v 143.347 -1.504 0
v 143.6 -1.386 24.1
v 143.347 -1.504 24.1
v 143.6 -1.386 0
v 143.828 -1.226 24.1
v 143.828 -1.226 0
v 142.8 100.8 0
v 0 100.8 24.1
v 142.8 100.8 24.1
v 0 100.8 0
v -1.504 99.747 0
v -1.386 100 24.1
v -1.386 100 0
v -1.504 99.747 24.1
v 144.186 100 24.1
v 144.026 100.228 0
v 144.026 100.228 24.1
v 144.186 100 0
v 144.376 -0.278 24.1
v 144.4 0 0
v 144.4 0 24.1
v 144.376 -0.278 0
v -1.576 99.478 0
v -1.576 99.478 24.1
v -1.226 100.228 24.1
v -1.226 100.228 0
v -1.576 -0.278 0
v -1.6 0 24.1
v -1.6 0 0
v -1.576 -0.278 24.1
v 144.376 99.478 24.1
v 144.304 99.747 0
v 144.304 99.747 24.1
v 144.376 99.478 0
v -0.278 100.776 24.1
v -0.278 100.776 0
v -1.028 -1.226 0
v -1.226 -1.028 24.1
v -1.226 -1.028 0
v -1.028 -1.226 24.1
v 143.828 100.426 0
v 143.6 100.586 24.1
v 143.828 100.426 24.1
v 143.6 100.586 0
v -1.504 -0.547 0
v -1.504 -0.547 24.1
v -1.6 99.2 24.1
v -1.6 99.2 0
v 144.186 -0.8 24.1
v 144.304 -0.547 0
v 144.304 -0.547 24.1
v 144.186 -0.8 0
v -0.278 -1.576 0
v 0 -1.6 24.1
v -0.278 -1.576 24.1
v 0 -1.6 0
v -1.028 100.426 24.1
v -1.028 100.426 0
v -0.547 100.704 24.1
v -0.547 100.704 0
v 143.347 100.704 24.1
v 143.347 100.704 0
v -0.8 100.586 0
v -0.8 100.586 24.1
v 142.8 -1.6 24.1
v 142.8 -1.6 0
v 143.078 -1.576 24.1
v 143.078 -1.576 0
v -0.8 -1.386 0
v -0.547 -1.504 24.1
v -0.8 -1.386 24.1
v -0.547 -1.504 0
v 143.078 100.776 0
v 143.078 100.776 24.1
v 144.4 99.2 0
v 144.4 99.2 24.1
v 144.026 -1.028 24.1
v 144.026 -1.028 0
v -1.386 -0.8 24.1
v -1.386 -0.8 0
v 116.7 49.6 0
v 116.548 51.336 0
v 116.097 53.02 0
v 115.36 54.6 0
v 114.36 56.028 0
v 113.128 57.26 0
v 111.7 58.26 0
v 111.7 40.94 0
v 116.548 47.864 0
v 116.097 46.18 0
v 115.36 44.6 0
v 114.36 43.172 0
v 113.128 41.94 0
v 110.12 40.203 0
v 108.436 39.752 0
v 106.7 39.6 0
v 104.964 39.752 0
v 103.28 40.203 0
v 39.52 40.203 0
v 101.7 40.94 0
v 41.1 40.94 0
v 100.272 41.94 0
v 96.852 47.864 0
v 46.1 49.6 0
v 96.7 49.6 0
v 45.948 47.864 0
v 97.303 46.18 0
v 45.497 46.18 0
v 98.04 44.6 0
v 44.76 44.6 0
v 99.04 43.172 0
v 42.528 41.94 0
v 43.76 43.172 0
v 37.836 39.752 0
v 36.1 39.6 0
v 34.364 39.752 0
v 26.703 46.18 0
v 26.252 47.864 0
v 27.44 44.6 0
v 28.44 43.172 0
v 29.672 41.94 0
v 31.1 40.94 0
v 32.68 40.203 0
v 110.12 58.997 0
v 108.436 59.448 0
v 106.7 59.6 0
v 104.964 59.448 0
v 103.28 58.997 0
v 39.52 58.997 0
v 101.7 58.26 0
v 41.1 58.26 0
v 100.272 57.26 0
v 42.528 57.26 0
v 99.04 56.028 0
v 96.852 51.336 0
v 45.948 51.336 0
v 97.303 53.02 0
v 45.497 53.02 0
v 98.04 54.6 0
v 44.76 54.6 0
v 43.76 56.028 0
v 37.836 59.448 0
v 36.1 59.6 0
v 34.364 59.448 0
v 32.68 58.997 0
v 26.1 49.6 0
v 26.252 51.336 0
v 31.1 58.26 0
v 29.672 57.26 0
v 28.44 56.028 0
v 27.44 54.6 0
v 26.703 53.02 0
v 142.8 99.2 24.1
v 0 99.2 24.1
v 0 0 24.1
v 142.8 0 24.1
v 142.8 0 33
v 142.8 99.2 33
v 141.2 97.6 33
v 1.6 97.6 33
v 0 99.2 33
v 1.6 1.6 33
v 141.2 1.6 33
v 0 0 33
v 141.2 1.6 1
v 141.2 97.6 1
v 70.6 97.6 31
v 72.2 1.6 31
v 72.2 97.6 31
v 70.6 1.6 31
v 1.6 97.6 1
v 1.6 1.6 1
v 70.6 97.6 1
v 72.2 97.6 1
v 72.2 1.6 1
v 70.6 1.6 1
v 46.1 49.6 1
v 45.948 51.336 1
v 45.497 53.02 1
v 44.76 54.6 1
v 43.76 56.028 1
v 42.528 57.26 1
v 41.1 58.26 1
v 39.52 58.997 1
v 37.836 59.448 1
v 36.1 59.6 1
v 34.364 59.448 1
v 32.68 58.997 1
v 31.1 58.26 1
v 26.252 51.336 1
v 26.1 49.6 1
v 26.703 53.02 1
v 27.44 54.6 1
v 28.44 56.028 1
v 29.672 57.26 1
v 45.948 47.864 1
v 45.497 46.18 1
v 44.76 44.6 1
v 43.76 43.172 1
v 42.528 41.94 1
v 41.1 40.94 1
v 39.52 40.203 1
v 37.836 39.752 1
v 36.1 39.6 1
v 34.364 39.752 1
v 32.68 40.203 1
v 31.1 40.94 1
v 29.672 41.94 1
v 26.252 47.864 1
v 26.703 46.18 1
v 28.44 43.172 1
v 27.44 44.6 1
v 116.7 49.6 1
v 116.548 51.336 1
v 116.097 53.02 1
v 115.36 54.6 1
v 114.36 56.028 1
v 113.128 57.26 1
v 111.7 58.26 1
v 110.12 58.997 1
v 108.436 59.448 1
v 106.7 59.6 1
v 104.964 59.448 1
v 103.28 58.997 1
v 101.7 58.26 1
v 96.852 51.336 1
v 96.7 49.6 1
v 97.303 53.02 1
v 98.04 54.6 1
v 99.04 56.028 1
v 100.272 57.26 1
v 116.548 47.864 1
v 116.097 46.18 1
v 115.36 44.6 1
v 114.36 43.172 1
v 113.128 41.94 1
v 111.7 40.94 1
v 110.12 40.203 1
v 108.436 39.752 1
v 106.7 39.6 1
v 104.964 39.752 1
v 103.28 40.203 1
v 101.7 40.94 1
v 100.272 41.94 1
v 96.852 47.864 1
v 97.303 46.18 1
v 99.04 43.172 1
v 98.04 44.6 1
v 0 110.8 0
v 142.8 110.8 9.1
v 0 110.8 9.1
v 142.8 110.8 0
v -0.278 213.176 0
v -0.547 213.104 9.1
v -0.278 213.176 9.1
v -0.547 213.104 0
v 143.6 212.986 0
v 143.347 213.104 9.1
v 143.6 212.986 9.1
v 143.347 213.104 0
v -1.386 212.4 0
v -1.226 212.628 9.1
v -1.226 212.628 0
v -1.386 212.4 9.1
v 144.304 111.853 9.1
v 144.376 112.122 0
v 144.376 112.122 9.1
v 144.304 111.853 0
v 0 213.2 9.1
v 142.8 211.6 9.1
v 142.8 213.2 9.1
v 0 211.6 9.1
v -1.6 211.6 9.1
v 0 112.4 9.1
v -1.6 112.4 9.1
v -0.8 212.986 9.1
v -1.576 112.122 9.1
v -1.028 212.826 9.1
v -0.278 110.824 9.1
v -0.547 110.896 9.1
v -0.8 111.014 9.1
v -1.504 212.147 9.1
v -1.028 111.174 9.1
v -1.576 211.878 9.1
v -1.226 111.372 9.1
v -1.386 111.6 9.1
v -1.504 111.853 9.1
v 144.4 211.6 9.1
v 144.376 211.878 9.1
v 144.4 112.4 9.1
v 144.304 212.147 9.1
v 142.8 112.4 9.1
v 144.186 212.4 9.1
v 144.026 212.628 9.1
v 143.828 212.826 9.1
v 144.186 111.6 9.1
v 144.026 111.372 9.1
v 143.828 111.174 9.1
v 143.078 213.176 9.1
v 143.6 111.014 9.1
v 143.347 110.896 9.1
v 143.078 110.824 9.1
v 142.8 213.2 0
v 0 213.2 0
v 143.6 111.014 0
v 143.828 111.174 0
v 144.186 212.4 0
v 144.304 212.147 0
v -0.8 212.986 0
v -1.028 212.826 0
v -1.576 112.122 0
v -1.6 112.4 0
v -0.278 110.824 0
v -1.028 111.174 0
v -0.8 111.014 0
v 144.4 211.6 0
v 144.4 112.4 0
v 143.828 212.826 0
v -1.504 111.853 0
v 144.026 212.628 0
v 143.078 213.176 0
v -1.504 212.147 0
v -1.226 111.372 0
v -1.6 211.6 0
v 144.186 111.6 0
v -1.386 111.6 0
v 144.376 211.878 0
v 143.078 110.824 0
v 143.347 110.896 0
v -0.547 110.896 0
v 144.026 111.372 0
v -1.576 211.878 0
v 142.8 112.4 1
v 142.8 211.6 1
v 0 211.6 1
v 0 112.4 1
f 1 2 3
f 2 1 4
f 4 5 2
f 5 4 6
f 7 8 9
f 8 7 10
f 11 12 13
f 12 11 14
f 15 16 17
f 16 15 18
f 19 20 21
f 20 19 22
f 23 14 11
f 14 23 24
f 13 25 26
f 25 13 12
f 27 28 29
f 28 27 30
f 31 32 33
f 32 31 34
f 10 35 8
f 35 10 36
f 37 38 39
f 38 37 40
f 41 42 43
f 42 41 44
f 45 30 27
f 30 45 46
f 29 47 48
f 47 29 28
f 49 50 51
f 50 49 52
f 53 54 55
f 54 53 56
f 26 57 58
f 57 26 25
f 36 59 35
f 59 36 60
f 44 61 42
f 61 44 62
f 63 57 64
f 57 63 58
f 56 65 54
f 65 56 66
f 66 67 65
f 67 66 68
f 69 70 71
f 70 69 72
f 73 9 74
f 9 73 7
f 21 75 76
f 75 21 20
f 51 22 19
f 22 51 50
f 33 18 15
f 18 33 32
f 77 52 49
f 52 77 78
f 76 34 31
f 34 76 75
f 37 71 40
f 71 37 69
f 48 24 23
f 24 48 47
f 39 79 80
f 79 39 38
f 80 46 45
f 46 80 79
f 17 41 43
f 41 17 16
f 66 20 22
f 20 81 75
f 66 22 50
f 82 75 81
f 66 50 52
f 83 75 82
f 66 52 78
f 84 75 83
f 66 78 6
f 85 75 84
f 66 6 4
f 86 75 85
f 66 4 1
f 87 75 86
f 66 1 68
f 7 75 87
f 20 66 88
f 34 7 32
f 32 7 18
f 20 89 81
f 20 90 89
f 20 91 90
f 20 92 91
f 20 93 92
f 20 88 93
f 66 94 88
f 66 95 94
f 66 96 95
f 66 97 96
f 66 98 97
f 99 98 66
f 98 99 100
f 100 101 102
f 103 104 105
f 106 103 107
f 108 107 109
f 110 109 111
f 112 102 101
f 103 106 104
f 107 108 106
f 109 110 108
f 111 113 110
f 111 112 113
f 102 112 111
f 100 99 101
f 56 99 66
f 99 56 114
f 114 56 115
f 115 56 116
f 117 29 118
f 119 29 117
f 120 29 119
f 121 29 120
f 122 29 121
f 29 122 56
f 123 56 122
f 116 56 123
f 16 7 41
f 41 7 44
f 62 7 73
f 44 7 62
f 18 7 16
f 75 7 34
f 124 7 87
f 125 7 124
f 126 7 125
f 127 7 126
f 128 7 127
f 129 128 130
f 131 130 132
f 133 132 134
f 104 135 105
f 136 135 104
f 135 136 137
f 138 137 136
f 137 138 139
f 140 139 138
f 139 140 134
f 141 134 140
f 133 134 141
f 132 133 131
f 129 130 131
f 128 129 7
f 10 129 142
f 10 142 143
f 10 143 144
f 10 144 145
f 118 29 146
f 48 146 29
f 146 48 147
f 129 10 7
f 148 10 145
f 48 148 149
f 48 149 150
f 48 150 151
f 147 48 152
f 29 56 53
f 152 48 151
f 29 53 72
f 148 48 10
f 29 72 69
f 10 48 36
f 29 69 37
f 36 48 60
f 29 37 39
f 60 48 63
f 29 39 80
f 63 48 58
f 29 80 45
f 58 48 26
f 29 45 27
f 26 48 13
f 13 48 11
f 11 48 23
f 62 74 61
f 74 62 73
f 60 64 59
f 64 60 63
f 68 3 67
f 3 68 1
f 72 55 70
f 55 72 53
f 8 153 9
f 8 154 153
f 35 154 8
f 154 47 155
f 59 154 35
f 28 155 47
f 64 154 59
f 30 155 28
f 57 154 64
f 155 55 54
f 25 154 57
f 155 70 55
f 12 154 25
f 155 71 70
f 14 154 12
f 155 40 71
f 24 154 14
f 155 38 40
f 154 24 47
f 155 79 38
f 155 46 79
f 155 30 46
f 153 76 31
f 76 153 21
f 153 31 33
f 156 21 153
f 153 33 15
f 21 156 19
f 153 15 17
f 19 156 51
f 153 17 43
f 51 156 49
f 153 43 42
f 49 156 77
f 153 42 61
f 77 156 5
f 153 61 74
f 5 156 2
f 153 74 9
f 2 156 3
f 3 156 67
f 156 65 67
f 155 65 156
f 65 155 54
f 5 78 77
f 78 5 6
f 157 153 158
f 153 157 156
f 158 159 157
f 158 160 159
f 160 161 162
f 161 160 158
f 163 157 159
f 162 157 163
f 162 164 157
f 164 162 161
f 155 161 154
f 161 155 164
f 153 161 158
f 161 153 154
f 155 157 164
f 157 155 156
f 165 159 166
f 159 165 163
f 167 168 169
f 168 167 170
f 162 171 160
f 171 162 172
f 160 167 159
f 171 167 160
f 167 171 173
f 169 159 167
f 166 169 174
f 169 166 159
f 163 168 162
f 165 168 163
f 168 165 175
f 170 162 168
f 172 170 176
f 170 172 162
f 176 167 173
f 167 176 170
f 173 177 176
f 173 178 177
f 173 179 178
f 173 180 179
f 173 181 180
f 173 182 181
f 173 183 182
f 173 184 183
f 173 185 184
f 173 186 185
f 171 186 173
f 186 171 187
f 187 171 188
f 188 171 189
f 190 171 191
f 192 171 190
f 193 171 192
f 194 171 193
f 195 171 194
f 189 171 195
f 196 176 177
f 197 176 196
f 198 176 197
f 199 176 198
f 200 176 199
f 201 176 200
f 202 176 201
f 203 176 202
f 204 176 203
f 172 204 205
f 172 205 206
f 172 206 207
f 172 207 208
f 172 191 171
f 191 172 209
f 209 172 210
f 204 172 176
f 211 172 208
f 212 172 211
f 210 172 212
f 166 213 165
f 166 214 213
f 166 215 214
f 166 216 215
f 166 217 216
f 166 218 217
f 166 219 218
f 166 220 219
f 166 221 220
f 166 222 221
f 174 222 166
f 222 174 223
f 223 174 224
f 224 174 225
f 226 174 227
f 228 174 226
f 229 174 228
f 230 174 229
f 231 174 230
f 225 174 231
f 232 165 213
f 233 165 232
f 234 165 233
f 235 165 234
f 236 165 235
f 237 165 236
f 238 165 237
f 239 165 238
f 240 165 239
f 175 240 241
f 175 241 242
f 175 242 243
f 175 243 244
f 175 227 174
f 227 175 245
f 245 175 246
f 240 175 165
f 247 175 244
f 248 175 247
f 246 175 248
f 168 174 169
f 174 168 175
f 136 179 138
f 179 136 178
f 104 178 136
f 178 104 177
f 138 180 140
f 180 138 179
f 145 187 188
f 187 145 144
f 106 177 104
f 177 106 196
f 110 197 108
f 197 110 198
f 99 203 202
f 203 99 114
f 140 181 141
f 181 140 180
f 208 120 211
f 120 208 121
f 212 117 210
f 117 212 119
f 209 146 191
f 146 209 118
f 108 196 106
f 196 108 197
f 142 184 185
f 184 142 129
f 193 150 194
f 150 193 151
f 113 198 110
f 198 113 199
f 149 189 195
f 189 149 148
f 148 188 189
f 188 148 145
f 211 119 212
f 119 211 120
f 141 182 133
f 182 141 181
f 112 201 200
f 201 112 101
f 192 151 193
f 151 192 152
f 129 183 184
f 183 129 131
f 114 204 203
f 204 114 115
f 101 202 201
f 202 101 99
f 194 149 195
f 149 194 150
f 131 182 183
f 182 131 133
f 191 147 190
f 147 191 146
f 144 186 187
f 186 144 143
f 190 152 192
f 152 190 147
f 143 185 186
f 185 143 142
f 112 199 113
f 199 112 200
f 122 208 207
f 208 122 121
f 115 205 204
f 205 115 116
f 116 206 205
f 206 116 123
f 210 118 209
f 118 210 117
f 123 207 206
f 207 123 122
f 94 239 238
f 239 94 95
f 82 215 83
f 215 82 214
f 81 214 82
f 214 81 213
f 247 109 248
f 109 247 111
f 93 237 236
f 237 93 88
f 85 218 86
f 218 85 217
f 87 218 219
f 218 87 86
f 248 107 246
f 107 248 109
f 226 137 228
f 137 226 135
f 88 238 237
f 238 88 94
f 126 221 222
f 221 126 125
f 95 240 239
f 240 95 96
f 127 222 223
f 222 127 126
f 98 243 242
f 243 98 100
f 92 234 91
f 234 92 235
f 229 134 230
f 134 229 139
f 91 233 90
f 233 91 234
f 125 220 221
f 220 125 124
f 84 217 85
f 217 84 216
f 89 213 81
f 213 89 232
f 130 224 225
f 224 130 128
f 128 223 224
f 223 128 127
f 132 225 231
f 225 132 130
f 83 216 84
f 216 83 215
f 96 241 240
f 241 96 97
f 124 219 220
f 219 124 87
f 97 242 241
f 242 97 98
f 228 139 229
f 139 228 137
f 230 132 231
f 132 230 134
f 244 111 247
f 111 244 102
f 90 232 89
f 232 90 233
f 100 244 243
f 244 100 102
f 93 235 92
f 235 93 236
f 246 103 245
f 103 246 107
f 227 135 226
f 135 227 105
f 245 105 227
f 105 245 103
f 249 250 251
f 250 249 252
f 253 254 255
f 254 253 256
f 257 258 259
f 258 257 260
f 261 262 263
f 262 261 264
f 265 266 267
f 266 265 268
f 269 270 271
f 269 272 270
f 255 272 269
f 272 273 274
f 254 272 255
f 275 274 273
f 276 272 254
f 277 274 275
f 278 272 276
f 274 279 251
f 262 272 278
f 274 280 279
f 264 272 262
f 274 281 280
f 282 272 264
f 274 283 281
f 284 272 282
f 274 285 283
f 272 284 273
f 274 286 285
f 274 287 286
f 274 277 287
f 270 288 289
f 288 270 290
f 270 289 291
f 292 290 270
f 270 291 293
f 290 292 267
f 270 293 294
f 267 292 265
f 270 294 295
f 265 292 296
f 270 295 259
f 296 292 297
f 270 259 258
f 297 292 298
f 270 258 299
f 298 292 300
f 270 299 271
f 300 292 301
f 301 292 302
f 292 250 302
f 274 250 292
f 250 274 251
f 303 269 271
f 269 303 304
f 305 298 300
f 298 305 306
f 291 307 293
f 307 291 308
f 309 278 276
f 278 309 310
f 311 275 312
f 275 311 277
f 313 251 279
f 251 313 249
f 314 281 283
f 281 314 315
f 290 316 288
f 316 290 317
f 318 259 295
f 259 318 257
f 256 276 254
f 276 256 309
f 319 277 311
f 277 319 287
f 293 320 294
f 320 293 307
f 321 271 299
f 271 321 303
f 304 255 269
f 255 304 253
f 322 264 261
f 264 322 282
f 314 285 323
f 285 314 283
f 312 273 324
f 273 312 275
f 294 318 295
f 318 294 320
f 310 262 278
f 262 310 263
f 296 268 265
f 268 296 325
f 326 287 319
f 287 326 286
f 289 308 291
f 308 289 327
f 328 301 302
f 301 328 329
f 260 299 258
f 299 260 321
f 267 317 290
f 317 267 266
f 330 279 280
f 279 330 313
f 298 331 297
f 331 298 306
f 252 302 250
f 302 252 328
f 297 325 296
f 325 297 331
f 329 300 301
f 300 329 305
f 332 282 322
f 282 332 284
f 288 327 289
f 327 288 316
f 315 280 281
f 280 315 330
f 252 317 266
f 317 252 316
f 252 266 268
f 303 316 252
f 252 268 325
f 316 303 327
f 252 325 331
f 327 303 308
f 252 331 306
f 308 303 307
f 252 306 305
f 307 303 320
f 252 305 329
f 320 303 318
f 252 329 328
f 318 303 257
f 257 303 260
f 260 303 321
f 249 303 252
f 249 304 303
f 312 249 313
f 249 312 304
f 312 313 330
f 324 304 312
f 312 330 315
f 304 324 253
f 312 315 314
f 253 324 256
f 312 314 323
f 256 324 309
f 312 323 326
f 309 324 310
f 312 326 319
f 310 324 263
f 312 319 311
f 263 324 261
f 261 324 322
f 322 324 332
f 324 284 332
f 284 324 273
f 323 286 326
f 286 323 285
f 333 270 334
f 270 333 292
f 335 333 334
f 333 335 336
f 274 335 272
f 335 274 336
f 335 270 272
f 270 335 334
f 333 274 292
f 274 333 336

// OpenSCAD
// Innovation 3rd Edition
//
// by W. Craig Trader is dual-licensed under 
// Creative Commons Attribution-ShareAlike 3.0 Unported License and
// GNU Lesser GPL 3.0 or later.

include <MCAD/units.scad>;

// Physical dimensions
WALL = 0.8 * mm; // Slicing filament thickness
GAP  = 0.2 * mm; // Size differential between box and lid, for snug fit
POKE_HOLE = 20 * mm; // Diameter of poke holes in bottom
BOTTOM = 1 * mm;

// Tile dimensions
CARD_WIDTH = 69 * mm;       // (X) Width of card
CARD_HEIGHT = 96 * mm;      // (Y) Height of card
DECK_THICKNESS = 30 * mm;   // (Z) Thickness of card stack

BOARD_WIDTH = 128 * mm;     // (X) Width of player board
BOARD_HEIGHT = 89 * mm;     // (Y) Height of player board

RULES_WIDTH = 117 * mm;     // (X) Width of rule book
RULES_HEIGHT = 85 * mm;     // (Y) Height of rule book

EXTRA_THICKNESS = 3 * mm;   // (Z) Thickness of rules and boards

// Wall dimensions
OUTER  = 2 * WALL;
INNER  = 2 * WALL;
SEP    = 2 * WALL;

OVERLAP = 0.1 * mm; // Ensures that there are no vertical artifacts leftover

// $fa=4;
$fn = 36;

box_height = DECK_THICKNESS;
lid_height = ceil( max( EXTRA_THICKNESS, 5 * mm ) );

s1 = ceil( max( CARD_WIDTH, (BOARD_WIDTH-SEP)/2, (RULES_WIDTH-SEP)/2 ) );
s2 = s1;

width = ceil( max( CARD_HEIGHT, BOARD_HEIGHT, RULES_HEIGHT ) );
length = 2*INNER + 1*SEP + s1 + s2;
height = 2*INNER + width;

echo( Width=width, BasicS1=s1, BasicS2=s2 );
echo( BasicInsideLength=length, BasicInsideHeight=height );
echo( BasicOutsideLength=length+2*OUTER, BasicOutsideHeight=height+2*OUTER );
echo( BasicOutsideDepth=BOTTOM+box_height+lid_height+BOTTOM );

module i3_flat_base() {

    difference() {
        // Outside of box
        minkowski() {
            cube( [ length, height, box_height+lid_height ] );
            cylinder( r=OUTER, h=OVERLAP );
        }
        
        // Remove upper lip
        translate( [ 0, 0, BOTTOM+box_height ] ) 
            cube( [ length, height, lid_height+OVERLAP ] );
        
        // Remove space for tiles
        translate( [ INNER, INNER, BOTTOM ] ) 
            cube( [ s1, width, box_height+OVERLAP ] );
        translate( [ INNER+s1+SEP, INNER, BOTTOM ] ) 
            cube( [ s2, width, box_height+OVERLAP ] );

        // Remove holes in bottom, for ease in removing tiles and parts
        translate( [ INNER+s1/2, INNER+width/2, -OVERLAP ] ) 
            cylinder( d=POKE_HOLE, h=BOTTOM+2*OVERLAP );
        translate( [ INNER+s1+1*SEP+s2/2, INNER+width/2, -OVERLAP ] ) 
            cylinder( d=POKE_HOLE, h=BOTTOM+2*OVERLAP );
    }
}

module i3_flat_top() {

    difference() {
        union() {
            minkowski() {
                cube( [ length, height, BOTTOM ] );
                cylinder( r=OUTER, h=BOTTOM );
            }
            translate( [ GAP, GAP, BOTTOM ] ) 
                cube( [ length-2*GAP, height-2*GAP, lid_height ] );
        }
        translate( [ INNER+GAP, INNER+GAP, BOTTOM ] ) 
            cube( [ length-2*INNER-2*GAP, height-2*INNER-2*GAP, lid_height+OVERLAP ] );
    }
}

box_height2 = DECK_THICKNESS + EXTRA_THICKNESS;
lid_height2 = ceil( box_height2 / 4 );

echo( FancyBoxHeight=box_height2, FancyLidHeight=lid_height2 );

module i4_base() {
    difference() {
        union() {
            minkowski() {
                cube( [ length, height, box_height2-lid_height2 ] );
                cylinder( r=OUTER, h=OVERLAP );
            }
            cube( [ length, height, box_height2 ]);
        }
        
        // Remove space for rules and boards
        translate( [ INNER, INNER, BOTTOM+box_height2-EXTRA_THICKNESS ] ) 
            cube( [ length-2*INNER, height-2*INNER, EXTRA_THICKNESS+OVERLAP ] );
        
        // Remove space for cards
        translate( [ INNER, INNER, BOTTOM ] ) 
            cube( [ s1, width, box_height2+OVERLAP ] );
        translate( [ INNER+s1+SEP, INNER, BOTTOM ] ) 
            cube( [ s2, width, box_height2+OVERLAP ] );

        // Remove holes in bottom, for ease in removing tiles and parts
        translate( [ INNER+s1/2, INNER+width/2, -OVERLAP ] ) 
            cylinder( d=POKE_HOLE, h=BOTTOM+2*OVERLAP );
        translate( [ INNER+s1+1*SEP+s2/2, INNER+width/2, -OVERLAP ] ) 
            cylinder( d=POKE_HOLE, h=BOTTOM+2*OVERLAP );
    }
}

module i4_top() {
    difference() {
        // Outside of lid
        minkowski() {
            cube( [ length, height, lid_height2 ] );
            cylinder( r=OUTER, h=OVERLAP );
        }
        
        translate( [ 0, 0, BOTTOM ] )
            cube( [ length, height, lid_height2+OVERLAP ] );
    }
}

show=6;

if (show == 1) {
    i3_flat_base();
} else if (show == 2) {
    i3_flat_top();
} else if (show == 3) {
    translate( [ 0,   0, 0 ] ) i3_flat_base();
    translate( [ 0, height+2*OUTER+10, 0 ] ) i3_flat_top();
} else if (show == 4) {
    i4_base();
} else if (show == 5) {
    i4_top();
} else if (show == 6) {
    translate( [ 0,   0, 0 ] ) i4_base();
    translate( [ 0, height+2*OUTER+10, 0 ] ) i4_top();
}

if (0) {
    echo( DELUXE_THICKNESS=DELUXE_THICKNESS, BASIC_THICKNESS=BASIC_THICKNESS );
    echo( TILE_WIDTH=TILE_WIDTH, SMALL_TILE_HEIGHT=SMALL_TILE_HEIGHT, LARGE_TILE_HEIGHT=LARGE_TILE_HEIGHT );
    echo( LARGE=16*DELUXE_THICKNESS, SMALL=14*DELUXE_THICKNESS, WIDTH=TILE_WIDTH );
    echo( 5*DELUXE_THICKNESS, SMALL_TILE_HEIGHT-5*DELUXE_THICKNESS );
}
